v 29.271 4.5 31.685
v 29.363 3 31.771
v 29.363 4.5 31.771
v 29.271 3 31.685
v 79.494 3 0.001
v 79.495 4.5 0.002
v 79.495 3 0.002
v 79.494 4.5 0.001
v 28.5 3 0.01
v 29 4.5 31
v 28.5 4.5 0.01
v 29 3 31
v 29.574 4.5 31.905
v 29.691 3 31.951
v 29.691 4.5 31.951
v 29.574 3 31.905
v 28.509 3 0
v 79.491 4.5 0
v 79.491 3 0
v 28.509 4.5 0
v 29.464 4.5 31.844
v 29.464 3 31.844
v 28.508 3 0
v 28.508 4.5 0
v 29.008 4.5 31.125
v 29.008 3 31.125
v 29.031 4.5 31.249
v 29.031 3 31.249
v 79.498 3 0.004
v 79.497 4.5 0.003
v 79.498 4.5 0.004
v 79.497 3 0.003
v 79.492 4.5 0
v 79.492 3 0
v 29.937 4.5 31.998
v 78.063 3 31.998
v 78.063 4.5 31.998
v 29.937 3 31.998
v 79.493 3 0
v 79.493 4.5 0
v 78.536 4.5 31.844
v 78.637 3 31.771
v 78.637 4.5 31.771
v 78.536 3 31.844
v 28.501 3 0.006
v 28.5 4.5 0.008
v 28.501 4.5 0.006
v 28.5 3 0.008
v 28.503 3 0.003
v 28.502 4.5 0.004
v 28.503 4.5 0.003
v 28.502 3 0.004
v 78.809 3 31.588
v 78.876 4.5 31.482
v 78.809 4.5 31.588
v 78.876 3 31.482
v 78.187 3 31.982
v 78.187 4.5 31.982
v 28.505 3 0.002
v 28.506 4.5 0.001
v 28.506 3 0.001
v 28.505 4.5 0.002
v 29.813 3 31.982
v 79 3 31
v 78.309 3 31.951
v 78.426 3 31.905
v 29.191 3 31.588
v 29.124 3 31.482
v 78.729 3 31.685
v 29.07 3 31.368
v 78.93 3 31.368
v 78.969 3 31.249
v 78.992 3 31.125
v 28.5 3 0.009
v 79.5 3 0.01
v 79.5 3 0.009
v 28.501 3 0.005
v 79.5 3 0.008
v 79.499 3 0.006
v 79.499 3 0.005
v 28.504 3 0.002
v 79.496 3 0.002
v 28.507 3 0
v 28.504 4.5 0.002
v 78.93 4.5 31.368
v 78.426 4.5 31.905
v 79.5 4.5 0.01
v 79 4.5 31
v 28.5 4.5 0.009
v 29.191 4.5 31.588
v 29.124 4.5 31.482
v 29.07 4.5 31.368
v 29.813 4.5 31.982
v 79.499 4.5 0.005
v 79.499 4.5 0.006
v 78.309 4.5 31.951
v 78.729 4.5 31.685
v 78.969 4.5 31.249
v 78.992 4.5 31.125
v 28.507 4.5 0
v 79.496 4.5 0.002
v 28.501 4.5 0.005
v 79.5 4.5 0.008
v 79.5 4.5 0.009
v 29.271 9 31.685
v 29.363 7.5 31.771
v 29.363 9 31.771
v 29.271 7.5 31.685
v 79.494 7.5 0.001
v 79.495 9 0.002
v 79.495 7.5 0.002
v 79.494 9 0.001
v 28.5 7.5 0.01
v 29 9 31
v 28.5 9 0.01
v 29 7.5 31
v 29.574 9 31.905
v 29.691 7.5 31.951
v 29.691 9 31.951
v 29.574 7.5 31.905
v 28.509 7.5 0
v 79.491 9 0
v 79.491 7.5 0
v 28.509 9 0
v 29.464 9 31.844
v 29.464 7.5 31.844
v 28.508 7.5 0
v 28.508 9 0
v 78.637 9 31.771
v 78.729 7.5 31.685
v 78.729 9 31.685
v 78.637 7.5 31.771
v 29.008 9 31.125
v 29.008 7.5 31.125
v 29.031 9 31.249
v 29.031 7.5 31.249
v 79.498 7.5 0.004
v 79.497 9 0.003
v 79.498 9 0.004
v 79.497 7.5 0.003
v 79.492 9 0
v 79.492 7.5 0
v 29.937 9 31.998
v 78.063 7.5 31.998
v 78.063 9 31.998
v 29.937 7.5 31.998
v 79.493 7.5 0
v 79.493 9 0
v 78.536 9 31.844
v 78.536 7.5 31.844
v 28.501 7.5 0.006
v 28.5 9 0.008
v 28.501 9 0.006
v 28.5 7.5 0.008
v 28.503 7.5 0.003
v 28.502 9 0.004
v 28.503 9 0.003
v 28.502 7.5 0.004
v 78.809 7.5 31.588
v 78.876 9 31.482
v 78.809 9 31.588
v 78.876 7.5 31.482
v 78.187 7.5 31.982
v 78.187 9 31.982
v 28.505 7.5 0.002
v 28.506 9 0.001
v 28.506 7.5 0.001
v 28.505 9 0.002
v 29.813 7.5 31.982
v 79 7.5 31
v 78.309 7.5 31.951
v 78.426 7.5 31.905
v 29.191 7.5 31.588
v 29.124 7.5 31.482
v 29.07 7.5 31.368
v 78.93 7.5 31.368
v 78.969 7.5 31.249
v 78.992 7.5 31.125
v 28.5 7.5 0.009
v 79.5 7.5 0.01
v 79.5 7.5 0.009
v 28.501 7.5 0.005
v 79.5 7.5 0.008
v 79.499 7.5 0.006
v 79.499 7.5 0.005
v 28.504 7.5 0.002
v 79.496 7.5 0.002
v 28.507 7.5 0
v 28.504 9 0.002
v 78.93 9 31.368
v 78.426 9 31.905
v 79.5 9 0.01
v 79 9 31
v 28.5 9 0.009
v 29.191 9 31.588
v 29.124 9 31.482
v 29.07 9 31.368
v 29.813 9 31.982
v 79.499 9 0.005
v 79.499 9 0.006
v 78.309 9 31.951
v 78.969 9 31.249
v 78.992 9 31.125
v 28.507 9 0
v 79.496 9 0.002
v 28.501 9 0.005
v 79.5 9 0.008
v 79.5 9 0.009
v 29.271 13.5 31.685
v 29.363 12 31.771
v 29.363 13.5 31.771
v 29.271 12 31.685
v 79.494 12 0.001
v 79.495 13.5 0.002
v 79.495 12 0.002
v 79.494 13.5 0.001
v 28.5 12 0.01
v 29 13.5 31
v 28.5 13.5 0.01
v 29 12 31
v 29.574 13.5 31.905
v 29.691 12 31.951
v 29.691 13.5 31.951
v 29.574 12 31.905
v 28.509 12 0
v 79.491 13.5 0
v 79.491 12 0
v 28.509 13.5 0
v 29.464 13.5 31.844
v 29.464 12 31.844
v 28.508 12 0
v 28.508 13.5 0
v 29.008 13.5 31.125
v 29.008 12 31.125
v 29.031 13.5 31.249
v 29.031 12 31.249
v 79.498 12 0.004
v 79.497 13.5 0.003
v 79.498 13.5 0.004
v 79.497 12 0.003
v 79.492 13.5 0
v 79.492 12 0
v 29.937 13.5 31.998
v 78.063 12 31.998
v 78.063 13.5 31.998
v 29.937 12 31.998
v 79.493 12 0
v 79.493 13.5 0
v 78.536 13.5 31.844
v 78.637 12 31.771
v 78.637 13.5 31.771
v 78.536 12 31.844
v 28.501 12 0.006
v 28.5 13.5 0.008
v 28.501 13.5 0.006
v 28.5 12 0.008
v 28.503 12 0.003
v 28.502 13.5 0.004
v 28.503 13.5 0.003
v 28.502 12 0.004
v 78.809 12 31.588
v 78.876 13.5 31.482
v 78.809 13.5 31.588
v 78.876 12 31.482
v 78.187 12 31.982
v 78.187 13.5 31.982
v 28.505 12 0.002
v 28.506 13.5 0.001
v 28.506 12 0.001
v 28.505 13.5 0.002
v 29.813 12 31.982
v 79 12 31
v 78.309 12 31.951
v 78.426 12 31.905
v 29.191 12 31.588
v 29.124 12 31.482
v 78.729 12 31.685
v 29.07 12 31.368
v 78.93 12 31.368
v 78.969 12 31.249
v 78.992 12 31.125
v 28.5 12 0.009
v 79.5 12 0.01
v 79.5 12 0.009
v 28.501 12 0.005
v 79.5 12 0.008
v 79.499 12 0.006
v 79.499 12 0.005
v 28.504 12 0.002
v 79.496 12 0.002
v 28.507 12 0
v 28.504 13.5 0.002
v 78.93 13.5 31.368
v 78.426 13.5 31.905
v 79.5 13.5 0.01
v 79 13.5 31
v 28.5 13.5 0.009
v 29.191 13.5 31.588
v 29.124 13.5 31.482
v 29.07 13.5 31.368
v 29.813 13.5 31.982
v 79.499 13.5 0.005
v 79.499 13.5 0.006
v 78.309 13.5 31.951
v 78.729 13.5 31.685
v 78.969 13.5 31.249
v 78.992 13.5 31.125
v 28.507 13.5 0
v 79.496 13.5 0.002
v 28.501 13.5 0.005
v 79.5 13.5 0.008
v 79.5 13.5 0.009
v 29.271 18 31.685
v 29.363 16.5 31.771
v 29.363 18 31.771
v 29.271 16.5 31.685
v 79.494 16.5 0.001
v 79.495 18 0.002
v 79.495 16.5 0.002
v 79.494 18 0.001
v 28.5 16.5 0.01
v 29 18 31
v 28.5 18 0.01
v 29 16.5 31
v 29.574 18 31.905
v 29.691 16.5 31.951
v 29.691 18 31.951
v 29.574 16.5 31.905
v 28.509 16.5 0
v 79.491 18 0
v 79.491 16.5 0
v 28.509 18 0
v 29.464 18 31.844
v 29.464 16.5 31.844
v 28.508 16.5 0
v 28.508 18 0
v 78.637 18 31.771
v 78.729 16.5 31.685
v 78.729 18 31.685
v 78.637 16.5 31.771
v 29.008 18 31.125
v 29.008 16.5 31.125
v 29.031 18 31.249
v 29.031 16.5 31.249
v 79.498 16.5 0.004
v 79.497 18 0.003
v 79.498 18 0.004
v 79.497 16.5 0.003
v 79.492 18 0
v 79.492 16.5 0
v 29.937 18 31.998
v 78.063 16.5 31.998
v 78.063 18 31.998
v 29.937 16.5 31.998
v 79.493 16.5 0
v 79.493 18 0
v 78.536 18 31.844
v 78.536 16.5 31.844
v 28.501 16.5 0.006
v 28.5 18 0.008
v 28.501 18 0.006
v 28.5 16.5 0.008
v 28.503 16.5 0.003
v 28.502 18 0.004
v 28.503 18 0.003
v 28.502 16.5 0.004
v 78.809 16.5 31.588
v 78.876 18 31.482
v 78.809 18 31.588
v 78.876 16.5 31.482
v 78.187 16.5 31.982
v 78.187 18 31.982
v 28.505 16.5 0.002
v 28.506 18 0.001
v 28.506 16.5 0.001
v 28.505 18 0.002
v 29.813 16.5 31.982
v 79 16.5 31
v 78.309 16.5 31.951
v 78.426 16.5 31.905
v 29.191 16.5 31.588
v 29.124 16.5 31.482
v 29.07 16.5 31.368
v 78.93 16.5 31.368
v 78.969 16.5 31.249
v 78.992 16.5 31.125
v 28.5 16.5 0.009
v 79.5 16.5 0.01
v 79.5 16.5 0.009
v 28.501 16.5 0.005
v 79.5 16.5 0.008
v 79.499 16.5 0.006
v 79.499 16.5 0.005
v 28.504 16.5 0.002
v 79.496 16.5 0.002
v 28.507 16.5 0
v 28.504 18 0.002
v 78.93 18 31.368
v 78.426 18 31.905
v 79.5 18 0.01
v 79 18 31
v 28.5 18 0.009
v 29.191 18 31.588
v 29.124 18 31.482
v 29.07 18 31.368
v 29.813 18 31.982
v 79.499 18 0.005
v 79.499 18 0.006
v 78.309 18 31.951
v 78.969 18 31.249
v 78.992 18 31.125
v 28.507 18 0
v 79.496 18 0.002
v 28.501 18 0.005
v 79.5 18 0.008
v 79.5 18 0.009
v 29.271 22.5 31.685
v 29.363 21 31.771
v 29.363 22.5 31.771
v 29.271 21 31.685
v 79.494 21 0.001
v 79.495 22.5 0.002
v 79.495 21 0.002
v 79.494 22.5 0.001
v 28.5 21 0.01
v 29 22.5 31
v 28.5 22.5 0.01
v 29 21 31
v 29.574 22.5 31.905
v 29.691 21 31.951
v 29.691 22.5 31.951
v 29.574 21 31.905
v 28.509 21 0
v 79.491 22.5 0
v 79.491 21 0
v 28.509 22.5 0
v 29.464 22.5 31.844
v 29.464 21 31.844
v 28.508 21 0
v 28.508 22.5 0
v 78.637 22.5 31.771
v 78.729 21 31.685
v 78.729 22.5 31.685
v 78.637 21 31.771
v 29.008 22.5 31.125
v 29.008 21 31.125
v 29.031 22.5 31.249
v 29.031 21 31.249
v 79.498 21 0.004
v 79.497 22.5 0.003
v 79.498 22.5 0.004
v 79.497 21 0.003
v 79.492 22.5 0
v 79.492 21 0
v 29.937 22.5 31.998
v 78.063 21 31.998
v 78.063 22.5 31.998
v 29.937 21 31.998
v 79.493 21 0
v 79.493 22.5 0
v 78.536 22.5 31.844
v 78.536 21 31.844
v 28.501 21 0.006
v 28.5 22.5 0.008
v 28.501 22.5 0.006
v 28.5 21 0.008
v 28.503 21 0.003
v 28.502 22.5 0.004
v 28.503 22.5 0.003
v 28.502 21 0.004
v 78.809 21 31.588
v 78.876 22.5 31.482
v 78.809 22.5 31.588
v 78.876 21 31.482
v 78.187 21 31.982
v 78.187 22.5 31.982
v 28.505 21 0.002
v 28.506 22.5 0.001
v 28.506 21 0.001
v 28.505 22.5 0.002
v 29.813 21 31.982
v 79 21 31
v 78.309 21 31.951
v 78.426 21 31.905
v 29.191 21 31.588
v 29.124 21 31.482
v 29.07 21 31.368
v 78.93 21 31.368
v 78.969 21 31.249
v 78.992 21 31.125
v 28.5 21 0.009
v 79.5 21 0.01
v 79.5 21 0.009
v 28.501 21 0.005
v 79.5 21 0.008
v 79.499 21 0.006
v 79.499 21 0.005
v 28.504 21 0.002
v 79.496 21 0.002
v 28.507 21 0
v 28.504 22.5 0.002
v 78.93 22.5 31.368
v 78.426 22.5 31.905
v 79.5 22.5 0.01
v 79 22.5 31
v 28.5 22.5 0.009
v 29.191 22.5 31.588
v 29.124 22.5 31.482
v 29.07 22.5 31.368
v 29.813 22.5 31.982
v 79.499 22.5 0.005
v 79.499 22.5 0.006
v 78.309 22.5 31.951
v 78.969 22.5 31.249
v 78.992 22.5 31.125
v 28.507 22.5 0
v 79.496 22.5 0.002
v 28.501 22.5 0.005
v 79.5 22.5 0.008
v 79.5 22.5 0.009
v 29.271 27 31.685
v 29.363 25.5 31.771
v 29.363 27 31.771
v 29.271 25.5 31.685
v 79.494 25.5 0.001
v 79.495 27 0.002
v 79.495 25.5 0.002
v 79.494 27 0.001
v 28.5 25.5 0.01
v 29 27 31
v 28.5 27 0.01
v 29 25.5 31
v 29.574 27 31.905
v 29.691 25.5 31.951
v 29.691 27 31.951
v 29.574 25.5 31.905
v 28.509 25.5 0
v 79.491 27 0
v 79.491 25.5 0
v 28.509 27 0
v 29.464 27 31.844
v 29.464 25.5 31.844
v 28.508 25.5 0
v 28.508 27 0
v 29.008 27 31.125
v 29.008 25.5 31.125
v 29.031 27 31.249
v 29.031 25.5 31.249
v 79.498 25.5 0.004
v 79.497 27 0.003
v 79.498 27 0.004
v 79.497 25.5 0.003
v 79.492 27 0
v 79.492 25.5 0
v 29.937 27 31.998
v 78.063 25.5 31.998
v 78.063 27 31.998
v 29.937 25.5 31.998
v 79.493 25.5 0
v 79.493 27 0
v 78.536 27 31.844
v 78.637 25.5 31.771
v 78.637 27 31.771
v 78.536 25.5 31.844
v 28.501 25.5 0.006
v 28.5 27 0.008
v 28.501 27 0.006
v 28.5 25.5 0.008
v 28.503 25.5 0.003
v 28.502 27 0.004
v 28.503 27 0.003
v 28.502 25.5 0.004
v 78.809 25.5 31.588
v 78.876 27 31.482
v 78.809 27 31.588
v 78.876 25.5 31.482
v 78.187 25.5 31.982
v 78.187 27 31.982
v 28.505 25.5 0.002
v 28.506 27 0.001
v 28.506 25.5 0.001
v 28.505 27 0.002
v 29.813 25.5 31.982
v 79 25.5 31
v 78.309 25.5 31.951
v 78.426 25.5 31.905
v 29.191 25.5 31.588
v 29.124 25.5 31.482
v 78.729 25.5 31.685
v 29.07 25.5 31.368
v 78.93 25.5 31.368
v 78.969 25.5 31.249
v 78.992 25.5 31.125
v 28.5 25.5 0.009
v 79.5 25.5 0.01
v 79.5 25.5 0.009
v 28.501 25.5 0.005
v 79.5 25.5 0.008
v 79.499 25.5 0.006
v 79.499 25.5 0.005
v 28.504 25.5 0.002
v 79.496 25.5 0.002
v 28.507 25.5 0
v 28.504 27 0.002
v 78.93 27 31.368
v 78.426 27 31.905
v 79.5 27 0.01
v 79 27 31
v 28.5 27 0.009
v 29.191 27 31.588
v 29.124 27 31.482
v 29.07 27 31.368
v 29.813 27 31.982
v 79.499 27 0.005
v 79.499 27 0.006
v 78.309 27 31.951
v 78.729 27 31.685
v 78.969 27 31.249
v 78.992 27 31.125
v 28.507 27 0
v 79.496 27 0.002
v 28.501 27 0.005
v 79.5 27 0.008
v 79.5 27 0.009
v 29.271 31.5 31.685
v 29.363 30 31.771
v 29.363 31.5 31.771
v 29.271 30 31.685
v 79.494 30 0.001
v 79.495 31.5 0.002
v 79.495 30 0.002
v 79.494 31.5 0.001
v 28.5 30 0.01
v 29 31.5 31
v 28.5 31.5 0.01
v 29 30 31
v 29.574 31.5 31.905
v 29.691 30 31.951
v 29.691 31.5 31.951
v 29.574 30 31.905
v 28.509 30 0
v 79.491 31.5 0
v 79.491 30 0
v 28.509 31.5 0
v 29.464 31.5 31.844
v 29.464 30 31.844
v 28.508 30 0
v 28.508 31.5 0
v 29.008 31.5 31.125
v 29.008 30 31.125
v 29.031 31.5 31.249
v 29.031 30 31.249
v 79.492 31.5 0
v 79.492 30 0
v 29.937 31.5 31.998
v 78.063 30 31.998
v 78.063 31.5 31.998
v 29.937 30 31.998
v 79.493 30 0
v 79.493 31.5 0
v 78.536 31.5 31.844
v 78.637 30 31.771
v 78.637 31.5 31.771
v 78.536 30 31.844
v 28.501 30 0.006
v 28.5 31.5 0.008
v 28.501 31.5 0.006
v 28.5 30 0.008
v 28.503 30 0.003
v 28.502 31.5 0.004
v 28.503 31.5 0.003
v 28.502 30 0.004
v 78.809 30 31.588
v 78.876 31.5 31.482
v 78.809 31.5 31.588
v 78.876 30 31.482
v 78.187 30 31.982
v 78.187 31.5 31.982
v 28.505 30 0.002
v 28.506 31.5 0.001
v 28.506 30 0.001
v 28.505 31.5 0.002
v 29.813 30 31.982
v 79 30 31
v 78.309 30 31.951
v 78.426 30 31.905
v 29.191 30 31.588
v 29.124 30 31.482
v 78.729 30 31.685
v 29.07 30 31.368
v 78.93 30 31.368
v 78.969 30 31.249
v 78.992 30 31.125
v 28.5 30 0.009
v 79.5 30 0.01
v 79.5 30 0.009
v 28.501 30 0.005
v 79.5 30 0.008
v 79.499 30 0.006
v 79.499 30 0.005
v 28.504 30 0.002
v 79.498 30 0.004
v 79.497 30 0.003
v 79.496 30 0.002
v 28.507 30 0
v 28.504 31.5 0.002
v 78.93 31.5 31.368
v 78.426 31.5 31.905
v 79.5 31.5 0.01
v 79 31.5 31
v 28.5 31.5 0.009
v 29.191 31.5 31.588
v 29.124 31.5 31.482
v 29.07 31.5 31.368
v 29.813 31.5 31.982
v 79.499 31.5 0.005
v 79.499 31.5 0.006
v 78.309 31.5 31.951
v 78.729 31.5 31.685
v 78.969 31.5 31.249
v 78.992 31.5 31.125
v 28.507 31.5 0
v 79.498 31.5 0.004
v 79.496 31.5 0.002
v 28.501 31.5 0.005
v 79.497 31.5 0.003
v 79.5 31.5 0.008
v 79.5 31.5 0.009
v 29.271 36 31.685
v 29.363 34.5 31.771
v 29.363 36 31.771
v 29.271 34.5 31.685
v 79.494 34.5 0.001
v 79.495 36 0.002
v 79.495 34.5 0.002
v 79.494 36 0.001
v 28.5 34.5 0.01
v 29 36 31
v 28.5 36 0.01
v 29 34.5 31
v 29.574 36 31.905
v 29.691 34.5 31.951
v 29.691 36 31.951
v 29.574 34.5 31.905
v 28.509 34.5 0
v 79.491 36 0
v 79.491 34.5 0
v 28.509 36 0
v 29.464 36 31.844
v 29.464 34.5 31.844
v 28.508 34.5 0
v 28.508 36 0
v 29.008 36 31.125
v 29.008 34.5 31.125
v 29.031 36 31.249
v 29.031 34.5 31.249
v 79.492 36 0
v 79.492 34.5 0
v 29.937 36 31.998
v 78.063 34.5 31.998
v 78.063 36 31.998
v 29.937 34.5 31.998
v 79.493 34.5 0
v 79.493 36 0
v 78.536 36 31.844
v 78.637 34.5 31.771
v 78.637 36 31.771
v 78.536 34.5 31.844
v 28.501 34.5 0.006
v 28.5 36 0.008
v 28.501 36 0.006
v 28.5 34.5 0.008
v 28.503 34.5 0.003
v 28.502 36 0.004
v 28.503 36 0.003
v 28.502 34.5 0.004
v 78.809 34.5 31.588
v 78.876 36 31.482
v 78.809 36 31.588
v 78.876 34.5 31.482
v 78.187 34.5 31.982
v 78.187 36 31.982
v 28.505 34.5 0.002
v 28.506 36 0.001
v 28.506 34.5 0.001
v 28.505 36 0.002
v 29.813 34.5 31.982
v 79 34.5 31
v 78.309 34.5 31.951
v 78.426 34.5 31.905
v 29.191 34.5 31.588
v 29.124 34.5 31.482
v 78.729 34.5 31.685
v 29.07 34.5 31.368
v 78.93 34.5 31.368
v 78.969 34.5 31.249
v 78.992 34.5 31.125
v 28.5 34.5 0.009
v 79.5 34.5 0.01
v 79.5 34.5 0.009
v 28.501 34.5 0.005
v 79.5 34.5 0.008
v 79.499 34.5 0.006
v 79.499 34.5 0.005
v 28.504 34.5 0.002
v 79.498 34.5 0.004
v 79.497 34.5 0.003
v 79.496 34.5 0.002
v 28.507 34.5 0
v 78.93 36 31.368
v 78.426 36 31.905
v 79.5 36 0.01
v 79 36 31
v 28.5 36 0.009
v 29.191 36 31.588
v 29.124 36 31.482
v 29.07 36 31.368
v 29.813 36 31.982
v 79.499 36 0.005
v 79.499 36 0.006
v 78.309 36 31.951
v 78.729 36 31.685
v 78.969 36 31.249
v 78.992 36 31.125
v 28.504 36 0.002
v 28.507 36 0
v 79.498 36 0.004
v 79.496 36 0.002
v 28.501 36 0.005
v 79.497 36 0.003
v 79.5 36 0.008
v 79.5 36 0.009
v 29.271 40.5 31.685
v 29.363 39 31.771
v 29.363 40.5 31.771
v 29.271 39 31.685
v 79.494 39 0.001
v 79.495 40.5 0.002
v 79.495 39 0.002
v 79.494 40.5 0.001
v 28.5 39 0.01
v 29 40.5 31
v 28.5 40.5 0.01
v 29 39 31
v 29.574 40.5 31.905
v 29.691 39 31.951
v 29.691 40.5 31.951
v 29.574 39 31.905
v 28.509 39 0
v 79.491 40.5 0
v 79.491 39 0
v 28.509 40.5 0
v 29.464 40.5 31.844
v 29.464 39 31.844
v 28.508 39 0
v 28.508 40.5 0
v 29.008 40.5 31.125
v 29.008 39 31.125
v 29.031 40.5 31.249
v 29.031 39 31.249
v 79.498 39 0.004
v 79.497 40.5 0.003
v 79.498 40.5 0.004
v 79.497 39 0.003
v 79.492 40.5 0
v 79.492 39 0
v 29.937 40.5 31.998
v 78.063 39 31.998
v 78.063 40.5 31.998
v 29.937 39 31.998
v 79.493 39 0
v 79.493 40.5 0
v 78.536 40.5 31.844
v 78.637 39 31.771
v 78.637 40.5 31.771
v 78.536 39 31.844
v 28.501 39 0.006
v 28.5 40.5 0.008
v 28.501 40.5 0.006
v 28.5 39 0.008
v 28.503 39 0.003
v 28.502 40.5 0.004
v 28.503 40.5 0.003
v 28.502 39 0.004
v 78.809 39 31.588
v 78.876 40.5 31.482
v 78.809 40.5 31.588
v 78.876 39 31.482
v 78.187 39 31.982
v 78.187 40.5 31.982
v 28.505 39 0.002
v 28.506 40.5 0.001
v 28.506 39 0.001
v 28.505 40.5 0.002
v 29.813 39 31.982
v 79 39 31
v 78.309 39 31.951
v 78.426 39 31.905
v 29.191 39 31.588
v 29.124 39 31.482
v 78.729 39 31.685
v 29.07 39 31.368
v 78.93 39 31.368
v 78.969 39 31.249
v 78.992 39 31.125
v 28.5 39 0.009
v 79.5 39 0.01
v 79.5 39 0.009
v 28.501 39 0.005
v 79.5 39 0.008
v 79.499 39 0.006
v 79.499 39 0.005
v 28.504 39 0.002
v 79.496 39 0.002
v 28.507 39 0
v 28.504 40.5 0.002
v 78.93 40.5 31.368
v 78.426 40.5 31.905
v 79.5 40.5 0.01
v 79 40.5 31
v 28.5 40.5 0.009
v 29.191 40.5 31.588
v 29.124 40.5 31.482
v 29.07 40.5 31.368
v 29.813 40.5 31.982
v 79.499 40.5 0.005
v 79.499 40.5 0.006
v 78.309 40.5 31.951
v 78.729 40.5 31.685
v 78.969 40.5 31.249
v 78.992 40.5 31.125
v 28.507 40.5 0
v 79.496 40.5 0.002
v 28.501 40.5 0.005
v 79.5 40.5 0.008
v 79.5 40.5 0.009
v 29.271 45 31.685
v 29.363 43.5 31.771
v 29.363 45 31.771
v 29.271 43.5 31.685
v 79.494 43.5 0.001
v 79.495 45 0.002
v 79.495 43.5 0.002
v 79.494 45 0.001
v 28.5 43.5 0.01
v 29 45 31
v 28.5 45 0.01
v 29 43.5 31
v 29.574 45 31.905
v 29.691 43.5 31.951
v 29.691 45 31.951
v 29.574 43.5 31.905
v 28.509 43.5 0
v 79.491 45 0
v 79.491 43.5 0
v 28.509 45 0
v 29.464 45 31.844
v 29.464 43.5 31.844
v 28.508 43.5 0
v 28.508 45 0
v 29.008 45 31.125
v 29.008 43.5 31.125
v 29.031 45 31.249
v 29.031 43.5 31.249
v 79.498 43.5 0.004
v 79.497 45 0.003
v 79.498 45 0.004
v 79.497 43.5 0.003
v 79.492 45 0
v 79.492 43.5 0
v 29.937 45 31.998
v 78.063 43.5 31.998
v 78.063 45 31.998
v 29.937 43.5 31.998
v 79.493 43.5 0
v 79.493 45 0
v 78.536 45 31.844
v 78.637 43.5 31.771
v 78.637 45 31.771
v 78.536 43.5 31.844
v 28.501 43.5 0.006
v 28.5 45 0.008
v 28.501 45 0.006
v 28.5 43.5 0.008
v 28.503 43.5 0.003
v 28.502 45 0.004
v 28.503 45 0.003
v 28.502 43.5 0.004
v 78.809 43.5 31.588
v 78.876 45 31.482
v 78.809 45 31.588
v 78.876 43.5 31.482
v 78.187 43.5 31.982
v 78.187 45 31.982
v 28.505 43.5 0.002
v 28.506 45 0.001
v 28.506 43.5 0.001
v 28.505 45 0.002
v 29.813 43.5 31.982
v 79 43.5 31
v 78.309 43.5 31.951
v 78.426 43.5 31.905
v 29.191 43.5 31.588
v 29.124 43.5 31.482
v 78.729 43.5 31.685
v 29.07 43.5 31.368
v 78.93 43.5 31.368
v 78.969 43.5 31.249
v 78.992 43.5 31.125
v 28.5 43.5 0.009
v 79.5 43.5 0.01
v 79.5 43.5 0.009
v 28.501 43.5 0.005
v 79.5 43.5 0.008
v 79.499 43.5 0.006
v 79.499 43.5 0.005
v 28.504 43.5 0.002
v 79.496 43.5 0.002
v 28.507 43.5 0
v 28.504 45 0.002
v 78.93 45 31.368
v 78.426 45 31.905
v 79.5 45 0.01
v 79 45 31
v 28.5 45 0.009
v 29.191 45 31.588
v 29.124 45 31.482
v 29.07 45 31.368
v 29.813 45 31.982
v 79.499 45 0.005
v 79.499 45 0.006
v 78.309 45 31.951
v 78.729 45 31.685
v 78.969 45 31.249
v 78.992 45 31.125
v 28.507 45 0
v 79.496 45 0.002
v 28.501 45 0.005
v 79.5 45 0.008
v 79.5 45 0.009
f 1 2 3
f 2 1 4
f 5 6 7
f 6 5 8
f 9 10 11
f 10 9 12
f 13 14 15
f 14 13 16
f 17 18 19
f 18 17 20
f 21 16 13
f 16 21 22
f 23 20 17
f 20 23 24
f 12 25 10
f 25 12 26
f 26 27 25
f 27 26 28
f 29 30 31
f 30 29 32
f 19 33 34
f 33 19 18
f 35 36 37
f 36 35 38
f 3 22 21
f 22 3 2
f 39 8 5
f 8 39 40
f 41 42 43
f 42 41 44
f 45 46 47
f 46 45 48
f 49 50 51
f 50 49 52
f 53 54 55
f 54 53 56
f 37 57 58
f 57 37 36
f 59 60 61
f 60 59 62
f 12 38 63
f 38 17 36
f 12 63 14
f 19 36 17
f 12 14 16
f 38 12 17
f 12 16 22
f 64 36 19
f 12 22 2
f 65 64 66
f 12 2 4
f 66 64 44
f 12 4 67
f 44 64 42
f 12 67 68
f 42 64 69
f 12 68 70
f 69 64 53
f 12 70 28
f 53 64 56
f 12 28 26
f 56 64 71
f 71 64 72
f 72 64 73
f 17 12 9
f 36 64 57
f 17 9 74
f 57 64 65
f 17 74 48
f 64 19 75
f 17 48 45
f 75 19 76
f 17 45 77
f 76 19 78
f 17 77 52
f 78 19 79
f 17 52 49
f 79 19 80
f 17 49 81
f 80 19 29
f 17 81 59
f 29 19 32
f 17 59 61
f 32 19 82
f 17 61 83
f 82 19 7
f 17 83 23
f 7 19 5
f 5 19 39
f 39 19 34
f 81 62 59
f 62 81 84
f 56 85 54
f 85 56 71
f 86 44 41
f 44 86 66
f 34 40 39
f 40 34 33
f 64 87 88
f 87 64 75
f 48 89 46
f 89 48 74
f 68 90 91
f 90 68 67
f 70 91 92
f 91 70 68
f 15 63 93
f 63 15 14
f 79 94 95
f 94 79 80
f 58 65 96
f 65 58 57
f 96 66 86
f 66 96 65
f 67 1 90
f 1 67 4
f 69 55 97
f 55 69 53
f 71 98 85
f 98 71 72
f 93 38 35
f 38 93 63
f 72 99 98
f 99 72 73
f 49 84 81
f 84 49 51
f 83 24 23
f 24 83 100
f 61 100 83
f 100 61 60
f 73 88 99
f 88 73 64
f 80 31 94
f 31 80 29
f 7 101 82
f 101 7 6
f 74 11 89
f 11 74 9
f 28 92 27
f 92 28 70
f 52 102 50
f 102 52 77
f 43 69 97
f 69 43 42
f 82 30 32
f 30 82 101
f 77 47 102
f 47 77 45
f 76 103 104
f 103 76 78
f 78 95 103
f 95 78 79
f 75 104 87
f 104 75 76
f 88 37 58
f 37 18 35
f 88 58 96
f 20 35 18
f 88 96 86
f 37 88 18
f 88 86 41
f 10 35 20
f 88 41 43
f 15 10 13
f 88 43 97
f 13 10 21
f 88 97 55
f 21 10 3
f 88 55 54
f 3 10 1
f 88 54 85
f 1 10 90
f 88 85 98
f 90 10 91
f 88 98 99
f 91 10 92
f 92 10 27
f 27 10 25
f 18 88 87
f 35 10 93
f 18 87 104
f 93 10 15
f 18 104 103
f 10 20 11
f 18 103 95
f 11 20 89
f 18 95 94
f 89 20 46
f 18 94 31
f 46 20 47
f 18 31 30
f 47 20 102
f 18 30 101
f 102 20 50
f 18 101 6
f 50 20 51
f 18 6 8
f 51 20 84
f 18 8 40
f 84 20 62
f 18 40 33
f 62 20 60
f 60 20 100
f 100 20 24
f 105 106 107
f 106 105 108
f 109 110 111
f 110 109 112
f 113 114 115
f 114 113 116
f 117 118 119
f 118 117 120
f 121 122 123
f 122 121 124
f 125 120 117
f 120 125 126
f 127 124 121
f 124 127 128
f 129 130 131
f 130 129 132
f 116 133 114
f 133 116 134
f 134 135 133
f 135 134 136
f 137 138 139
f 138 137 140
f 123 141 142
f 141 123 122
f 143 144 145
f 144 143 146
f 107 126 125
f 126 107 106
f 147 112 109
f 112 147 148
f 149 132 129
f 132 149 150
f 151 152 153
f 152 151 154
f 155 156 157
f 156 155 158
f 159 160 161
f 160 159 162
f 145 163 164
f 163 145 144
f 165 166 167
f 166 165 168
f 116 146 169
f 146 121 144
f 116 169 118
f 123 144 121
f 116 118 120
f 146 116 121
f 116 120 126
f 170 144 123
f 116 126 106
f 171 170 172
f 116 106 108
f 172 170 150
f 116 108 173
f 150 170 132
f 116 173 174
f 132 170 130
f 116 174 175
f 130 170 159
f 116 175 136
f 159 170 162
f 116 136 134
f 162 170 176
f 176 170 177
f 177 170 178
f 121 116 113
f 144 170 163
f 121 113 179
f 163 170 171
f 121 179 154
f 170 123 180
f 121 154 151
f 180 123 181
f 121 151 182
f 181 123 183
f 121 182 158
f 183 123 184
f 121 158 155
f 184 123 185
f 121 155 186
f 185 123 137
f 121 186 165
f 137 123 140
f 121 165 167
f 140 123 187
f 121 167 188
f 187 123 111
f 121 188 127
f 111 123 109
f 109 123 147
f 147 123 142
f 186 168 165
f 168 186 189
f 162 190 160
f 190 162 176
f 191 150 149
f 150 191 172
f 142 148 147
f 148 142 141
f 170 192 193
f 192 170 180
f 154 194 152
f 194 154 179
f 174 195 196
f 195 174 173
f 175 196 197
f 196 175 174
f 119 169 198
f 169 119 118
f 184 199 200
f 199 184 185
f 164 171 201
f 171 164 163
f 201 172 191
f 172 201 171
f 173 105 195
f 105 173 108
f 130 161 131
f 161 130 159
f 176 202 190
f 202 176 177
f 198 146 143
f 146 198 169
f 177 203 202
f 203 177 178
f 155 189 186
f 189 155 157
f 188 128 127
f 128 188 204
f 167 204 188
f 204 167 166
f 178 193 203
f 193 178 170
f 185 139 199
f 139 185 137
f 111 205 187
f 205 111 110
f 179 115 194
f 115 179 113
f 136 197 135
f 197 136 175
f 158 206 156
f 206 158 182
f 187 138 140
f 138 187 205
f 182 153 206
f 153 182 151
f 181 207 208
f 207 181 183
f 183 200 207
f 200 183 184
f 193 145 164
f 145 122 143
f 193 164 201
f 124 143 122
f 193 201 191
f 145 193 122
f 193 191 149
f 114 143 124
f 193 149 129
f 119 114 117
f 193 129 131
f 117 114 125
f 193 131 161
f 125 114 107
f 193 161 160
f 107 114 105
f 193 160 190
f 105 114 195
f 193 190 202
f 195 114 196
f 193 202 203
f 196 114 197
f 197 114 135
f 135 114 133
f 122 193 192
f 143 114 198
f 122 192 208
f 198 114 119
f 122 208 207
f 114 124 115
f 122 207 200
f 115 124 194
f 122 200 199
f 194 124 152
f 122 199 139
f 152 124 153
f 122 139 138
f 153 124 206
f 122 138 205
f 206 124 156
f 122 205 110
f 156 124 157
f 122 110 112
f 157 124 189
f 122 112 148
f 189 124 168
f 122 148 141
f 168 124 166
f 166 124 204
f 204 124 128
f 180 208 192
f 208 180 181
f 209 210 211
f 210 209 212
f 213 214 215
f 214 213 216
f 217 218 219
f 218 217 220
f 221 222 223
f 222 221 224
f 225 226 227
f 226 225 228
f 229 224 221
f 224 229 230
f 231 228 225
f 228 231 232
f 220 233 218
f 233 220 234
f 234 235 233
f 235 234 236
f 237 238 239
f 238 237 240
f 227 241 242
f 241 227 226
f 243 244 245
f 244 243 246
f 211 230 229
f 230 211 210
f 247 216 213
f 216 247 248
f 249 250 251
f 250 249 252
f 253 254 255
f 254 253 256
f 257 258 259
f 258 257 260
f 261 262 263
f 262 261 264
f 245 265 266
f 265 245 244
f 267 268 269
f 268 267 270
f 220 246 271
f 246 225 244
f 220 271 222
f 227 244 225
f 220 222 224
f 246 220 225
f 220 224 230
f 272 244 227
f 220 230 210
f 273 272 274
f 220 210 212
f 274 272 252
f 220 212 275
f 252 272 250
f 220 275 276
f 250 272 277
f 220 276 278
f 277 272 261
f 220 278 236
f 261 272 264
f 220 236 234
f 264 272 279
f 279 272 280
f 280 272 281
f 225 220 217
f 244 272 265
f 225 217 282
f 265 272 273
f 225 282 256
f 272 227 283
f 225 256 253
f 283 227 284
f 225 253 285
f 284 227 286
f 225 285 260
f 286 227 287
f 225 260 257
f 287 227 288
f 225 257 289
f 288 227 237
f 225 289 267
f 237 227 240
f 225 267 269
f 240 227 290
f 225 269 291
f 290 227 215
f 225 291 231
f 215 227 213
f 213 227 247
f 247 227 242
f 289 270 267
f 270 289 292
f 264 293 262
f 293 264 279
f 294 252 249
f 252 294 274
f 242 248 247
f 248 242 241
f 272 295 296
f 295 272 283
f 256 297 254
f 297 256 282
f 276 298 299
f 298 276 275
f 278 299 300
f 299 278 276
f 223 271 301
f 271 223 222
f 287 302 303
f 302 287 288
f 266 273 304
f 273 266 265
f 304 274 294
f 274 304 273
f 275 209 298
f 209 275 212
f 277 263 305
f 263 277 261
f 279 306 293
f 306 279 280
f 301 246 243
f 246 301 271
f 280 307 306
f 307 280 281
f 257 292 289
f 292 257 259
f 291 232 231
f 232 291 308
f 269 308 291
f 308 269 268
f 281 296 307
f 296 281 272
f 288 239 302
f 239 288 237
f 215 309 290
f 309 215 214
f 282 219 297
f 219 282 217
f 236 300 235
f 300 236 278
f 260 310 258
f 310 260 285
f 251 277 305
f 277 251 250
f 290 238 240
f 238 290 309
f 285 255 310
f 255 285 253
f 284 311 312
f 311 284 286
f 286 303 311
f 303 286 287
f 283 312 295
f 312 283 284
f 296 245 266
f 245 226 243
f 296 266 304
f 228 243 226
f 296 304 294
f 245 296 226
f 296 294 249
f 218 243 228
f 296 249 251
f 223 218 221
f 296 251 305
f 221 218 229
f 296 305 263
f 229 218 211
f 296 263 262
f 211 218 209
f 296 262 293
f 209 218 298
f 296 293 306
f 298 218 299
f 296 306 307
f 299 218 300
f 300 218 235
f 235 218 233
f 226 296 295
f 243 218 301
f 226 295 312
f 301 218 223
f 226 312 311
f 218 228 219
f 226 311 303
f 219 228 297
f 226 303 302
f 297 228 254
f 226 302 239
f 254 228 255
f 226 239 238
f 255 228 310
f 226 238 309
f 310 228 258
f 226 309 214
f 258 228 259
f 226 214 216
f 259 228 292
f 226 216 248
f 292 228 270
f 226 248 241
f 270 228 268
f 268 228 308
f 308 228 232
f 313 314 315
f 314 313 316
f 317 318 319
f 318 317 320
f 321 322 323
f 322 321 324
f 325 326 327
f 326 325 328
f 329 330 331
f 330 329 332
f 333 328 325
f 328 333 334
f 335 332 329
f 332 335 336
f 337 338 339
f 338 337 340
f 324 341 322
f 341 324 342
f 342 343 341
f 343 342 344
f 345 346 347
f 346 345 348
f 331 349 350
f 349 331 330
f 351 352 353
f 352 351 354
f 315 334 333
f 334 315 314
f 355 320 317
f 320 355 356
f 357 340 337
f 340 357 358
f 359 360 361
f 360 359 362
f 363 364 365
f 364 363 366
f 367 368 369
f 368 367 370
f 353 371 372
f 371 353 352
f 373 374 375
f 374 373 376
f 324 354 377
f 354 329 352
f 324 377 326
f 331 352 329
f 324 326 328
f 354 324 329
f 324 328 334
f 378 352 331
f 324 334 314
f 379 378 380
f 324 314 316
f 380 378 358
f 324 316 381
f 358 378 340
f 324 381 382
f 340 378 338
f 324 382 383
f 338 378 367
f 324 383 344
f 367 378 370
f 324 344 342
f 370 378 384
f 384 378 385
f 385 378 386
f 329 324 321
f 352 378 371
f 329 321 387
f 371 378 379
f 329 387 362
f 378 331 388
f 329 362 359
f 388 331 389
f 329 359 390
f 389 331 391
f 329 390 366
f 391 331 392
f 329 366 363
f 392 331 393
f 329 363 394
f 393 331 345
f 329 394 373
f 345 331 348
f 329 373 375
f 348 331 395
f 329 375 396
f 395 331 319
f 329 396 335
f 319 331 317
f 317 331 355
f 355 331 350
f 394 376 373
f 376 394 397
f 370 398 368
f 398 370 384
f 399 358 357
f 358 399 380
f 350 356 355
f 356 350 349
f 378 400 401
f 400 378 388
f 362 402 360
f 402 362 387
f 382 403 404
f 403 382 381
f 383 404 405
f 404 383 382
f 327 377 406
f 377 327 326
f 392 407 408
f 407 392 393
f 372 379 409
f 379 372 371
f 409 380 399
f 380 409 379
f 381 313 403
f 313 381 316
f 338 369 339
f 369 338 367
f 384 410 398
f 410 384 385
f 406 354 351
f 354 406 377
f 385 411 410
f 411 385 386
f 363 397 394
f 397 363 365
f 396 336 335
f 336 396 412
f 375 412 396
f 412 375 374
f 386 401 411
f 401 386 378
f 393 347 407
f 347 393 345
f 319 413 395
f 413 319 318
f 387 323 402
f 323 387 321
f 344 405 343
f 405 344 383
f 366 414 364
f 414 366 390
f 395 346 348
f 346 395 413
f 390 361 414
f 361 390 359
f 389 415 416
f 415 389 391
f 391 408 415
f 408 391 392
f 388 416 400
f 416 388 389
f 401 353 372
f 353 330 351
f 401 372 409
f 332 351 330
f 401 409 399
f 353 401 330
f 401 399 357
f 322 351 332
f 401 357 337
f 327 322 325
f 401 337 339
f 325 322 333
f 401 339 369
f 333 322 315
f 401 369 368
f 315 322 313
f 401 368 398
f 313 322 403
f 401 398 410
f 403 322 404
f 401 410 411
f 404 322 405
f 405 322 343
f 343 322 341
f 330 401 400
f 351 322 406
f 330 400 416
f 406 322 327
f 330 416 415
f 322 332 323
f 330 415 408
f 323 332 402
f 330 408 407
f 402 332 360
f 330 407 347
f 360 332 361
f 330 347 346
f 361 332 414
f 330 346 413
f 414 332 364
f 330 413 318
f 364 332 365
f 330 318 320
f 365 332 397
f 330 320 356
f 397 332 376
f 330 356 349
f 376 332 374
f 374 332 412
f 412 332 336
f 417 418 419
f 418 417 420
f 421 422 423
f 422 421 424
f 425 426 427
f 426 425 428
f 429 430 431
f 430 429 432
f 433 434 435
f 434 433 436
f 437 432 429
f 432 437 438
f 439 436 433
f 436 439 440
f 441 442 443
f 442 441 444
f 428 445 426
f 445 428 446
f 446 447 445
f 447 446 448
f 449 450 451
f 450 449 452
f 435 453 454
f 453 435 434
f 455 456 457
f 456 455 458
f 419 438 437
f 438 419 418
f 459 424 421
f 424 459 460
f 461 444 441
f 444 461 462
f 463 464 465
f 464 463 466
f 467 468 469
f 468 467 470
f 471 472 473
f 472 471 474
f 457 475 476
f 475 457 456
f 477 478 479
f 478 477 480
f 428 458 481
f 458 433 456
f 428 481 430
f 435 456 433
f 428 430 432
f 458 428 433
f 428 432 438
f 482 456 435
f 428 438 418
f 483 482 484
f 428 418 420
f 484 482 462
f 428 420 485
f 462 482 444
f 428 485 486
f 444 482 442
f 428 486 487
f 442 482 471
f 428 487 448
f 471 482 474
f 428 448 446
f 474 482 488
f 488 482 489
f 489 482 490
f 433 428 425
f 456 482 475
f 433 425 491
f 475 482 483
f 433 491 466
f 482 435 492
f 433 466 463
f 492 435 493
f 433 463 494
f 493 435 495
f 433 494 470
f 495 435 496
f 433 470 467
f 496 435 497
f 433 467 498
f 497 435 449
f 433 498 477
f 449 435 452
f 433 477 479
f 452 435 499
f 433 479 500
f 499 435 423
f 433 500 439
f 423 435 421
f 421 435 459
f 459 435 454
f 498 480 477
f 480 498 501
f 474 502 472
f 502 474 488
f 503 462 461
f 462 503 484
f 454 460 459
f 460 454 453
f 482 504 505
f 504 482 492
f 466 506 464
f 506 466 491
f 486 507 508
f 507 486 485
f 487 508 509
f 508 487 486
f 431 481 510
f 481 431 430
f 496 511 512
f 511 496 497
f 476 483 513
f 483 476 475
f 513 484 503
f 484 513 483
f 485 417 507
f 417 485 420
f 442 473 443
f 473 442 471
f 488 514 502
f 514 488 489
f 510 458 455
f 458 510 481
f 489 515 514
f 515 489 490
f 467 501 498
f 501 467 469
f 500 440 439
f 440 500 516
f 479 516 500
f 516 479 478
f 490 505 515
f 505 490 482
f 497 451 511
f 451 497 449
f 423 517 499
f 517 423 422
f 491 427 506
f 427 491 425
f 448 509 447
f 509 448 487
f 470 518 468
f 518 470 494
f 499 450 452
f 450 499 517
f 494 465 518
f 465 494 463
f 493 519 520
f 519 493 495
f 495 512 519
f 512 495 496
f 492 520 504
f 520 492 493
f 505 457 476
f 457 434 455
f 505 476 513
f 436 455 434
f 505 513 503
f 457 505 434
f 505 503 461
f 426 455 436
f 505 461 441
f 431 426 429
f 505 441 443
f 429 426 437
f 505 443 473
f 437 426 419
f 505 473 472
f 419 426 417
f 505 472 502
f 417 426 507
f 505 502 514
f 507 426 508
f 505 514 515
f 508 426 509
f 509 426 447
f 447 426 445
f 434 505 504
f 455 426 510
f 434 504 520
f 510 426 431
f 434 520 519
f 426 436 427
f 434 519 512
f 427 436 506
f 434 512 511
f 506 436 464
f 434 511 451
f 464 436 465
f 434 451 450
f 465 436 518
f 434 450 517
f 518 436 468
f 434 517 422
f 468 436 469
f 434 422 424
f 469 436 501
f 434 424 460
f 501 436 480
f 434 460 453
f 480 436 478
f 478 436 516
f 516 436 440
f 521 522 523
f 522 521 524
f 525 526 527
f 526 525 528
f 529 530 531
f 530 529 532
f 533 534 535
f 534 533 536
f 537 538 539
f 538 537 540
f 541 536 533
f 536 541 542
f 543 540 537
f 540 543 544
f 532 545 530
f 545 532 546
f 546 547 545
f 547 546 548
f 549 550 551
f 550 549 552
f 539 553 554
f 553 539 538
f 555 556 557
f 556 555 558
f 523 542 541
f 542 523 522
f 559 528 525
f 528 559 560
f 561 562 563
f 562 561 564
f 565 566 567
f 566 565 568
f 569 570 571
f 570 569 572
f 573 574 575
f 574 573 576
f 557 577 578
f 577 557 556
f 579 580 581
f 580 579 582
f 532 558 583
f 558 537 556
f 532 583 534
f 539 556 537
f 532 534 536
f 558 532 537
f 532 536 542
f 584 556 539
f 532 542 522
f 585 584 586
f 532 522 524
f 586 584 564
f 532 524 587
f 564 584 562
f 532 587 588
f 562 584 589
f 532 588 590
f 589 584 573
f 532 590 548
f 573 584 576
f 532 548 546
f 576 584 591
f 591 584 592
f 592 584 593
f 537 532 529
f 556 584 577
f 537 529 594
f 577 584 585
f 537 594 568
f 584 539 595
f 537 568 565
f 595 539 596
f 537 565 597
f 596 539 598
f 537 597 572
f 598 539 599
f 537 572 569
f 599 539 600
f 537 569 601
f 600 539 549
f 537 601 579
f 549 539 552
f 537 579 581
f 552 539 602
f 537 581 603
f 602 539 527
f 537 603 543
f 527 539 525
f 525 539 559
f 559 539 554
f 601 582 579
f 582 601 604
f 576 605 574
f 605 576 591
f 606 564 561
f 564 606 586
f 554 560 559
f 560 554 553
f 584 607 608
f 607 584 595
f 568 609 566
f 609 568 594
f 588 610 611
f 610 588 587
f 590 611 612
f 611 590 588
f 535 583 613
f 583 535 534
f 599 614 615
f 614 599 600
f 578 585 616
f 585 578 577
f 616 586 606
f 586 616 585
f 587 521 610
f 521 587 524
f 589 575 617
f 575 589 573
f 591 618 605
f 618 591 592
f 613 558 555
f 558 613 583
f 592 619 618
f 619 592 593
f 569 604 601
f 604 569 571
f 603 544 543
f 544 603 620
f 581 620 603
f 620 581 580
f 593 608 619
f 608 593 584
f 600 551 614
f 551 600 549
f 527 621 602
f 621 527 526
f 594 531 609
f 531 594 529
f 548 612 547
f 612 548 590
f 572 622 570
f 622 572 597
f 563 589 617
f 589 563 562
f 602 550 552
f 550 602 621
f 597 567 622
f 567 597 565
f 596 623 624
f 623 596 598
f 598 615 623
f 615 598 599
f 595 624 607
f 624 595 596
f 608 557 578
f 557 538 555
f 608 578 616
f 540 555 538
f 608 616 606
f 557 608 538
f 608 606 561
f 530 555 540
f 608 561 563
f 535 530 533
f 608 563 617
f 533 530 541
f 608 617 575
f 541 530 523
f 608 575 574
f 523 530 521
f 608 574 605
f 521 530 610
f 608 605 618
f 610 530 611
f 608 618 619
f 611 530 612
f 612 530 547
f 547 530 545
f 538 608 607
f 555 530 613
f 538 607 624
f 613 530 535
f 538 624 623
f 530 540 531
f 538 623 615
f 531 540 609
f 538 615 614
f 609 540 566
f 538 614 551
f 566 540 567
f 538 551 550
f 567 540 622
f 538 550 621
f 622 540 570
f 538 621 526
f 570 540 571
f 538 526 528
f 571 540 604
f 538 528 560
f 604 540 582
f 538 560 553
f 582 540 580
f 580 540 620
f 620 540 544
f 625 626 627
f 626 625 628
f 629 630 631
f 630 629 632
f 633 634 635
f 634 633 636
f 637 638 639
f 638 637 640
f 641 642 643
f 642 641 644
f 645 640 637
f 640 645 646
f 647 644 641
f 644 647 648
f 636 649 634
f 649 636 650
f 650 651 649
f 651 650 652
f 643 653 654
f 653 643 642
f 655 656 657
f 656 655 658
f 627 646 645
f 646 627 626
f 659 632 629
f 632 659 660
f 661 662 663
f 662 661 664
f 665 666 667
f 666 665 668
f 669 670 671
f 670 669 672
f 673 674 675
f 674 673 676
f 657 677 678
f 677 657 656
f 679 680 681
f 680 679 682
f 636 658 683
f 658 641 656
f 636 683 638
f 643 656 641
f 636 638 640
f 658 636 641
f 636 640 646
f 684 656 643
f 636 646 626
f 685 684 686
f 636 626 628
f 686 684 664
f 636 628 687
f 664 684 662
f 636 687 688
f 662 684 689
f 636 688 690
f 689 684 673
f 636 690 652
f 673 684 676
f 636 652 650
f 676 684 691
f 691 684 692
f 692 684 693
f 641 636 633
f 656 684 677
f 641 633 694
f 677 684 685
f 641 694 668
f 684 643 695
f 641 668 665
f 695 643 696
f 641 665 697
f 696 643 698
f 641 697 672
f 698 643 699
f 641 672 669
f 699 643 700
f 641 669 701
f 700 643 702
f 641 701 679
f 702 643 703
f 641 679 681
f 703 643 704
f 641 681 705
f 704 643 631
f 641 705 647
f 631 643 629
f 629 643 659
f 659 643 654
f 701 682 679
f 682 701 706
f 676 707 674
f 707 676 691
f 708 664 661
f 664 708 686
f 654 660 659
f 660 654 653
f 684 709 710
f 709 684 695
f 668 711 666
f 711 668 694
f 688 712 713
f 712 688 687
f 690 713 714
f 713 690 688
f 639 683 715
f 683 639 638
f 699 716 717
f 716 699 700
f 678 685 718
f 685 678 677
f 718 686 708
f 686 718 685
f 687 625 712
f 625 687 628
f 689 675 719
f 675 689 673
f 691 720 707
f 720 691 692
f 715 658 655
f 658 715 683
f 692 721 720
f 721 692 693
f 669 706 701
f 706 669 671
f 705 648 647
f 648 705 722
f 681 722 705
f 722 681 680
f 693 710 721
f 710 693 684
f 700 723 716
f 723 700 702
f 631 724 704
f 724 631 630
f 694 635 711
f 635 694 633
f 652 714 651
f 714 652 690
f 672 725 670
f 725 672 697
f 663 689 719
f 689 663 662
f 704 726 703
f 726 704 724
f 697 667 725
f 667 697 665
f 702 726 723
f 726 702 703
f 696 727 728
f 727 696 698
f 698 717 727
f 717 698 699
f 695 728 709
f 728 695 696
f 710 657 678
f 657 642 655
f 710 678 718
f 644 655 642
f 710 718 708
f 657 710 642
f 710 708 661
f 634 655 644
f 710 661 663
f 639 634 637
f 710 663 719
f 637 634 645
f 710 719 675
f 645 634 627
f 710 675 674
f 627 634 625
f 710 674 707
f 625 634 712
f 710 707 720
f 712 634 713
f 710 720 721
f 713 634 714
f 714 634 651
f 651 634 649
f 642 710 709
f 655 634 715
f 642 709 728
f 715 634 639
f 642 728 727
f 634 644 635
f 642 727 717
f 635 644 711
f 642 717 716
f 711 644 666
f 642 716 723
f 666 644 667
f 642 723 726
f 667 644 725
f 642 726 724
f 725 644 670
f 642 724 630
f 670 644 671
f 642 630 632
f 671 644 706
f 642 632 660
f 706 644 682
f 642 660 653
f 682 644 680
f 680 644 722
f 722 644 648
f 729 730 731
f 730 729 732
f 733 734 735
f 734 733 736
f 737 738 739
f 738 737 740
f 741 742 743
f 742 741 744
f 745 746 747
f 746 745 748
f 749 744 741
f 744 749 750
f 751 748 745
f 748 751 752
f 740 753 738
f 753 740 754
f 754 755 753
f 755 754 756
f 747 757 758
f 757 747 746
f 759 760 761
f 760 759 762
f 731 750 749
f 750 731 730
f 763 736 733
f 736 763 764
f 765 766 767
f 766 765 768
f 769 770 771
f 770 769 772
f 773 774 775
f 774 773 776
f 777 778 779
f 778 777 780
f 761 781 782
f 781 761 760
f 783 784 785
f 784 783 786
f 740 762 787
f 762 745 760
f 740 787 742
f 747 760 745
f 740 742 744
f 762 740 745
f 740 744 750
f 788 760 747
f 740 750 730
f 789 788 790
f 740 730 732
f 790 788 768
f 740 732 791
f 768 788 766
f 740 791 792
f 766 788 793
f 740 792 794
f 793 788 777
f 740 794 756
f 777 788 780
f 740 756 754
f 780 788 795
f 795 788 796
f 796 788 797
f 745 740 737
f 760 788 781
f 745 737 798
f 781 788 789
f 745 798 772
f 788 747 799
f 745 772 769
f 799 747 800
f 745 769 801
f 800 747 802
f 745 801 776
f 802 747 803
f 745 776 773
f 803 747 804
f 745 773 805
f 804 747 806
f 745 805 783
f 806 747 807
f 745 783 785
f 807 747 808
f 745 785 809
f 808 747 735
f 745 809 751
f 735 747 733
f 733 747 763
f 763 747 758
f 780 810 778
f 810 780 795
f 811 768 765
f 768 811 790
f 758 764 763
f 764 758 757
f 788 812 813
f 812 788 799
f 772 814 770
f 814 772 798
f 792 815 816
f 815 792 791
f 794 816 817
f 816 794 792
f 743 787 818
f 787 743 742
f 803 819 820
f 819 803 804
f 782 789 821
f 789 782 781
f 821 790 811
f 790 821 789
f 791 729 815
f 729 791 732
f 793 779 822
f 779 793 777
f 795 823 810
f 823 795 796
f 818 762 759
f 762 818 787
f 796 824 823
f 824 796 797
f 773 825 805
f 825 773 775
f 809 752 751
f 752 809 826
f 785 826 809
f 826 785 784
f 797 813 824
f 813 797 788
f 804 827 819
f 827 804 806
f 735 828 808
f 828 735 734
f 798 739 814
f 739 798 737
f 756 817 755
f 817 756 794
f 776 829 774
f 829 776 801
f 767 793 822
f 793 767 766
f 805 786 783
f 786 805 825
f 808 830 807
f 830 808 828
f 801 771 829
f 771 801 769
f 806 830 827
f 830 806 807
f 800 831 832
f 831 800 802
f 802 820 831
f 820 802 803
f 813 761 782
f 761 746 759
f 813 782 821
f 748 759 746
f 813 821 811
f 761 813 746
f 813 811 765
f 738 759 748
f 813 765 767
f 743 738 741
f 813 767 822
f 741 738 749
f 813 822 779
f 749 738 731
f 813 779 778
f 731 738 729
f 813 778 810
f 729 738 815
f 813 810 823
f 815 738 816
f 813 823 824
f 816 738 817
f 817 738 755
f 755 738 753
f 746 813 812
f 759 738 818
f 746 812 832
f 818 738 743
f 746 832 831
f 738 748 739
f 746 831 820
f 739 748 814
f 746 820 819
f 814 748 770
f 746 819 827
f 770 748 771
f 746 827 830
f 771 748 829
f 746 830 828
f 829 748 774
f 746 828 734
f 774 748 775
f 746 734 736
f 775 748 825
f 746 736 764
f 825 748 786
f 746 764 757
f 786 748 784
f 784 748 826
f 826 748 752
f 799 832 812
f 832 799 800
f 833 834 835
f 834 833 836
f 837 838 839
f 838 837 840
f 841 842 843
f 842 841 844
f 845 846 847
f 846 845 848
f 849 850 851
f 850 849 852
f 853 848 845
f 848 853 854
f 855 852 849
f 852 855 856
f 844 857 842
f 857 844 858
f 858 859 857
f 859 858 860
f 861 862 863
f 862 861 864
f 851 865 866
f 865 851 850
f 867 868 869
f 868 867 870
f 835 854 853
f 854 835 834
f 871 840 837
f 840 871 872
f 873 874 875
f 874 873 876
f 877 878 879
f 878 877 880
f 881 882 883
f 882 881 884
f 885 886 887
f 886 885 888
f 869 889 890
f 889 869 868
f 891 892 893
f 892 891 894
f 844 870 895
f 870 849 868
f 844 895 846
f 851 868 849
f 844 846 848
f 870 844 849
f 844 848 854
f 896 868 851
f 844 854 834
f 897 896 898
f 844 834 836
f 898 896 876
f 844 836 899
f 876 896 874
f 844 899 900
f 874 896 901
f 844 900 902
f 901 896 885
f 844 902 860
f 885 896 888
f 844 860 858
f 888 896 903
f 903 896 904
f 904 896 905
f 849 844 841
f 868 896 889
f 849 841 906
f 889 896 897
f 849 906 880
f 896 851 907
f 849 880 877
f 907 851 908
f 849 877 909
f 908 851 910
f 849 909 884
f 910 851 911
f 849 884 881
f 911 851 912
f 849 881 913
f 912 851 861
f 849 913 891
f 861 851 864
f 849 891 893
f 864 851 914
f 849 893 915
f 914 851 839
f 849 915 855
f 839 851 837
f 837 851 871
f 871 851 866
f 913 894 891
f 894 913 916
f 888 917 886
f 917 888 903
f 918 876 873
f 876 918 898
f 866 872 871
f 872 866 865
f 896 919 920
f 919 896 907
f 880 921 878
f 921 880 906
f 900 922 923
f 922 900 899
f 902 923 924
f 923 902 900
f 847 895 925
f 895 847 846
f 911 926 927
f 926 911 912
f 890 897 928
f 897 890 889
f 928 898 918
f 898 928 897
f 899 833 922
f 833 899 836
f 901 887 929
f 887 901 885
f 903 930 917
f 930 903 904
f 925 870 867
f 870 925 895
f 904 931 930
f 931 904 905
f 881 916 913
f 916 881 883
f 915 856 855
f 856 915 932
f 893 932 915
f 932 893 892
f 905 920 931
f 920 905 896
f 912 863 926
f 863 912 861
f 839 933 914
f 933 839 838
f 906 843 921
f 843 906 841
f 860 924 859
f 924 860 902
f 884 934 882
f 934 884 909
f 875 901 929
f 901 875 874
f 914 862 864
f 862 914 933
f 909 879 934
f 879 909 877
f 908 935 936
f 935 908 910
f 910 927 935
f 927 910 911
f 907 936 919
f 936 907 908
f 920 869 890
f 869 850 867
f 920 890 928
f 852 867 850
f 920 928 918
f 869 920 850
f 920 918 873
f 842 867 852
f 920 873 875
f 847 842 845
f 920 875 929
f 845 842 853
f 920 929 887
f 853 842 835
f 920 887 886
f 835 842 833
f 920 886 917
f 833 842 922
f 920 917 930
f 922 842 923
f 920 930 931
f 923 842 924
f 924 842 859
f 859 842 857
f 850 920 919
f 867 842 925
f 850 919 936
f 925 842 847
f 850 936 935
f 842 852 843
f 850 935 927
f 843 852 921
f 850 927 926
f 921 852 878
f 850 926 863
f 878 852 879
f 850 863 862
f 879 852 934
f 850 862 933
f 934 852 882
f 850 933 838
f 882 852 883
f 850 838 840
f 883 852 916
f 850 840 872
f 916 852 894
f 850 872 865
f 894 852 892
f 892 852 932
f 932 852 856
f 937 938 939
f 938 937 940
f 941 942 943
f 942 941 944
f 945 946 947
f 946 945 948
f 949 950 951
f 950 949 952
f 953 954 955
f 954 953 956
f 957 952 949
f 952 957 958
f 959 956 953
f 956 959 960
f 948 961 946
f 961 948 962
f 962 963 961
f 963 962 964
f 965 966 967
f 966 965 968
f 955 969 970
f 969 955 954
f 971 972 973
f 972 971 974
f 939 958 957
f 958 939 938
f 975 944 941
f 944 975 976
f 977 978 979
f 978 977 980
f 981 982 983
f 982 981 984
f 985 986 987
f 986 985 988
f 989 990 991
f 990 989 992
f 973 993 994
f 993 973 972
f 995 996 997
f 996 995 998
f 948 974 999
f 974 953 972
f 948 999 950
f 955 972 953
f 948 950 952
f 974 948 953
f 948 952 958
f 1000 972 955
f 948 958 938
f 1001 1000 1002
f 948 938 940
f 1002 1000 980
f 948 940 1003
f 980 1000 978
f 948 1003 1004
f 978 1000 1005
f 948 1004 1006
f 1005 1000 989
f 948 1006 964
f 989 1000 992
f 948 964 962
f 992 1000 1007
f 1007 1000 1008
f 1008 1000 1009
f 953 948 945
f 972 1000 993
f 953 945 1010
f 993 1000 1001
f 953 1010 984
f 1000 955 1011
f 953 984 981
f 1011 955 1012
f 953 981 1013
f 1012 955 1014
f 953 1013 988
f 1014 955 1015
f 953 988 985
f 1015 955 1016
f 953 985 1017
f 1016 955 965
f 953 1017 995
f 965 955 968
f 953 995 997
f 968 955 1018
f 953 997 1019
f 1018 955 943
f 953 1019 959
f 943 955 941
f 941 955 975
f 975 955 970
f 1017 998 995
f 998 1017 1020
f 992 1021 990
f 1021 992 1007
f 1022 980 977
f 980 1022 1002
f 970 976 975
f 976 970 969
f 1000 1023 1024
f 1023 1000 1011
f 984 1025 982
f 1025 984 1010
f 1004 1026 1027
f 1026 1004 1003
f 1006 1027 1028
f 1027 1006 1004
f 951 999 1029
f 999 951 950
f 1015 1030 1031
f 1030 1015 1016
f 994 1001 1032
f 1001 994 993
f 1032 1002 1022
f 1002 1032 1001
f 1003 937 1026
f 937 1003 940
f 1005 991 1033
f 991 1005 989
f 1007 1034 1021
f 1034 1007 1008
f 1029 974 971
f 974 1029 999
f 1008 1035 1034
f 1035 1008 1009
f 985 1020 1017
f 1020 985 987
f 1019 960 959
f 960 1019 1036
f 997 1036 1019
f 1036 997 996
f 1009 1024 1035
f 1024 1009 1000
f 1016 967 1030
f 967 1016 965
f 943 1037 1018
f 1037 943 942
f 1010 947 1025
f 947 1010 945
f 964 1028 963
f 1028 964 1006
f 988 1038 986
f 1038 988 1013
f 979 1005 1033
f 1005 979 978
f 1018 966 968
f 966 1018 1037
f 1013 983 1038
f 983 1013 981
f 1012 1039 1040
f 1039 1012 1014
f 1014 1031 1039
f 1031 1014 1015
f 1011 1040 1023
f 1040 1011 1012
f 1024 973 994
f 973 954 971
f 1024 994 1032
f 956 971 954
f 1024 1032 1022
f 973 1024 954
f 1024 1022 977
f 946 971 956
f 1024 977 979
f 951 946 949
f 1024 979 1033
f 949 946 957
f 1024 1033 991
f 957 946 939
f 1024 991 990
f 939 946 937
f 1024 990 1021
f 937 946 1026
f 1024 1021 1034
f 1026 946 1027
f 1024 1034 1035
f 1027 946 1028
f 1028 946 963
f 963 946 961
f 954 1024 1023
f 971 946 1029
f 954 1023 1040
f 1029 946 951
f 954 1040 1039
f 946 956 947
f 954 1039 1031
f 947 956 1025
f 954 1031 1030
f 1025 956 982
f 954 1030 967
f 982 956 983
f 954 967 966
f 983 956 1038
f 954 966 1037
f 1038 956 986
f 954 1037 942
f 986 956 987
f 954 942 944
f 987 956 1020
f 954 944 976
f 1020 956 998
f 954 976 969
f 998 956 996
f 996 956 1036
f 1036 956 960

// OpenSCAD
bottom_width = 50;
top_width = 51;
height = 32;
thickness = 1.5;
bottom_radius = 1; // [0.01:10]
top_radius = 0.01; // [0.01:10]

grid_separation = 3;
grid_rows = 1;
grid_columns = 10;

/* [Hidden] */
$fn = 50;

module divider() {
	rotate(90, [1,0,0]) hull() {
		translate([bottom_width/2-bottom_radius,height-bottom_radius,0]) cylinder(r=bottom_radius, h=thickness);
		translate([-bottom_width/2+bottom_radius,height-bottom_radius,0]) cylinder(r=bottom_radius, h=thickness);
		translate([top_width/2-top_radius,top_radius,0]) cylinder(r=top_radius, h=thickness);
		translate([-top_width/2+top_radius,top_radius,0]) cylinder(r=top_radius, h=thickness);
	}
}

for(a = [1:grid_rows])
	for(b = [1:grid_columns])
		translate([a*(grid_separation + max(bottom_width, top_width)), b*(grid_separation + thickness), 0])
			divider();
